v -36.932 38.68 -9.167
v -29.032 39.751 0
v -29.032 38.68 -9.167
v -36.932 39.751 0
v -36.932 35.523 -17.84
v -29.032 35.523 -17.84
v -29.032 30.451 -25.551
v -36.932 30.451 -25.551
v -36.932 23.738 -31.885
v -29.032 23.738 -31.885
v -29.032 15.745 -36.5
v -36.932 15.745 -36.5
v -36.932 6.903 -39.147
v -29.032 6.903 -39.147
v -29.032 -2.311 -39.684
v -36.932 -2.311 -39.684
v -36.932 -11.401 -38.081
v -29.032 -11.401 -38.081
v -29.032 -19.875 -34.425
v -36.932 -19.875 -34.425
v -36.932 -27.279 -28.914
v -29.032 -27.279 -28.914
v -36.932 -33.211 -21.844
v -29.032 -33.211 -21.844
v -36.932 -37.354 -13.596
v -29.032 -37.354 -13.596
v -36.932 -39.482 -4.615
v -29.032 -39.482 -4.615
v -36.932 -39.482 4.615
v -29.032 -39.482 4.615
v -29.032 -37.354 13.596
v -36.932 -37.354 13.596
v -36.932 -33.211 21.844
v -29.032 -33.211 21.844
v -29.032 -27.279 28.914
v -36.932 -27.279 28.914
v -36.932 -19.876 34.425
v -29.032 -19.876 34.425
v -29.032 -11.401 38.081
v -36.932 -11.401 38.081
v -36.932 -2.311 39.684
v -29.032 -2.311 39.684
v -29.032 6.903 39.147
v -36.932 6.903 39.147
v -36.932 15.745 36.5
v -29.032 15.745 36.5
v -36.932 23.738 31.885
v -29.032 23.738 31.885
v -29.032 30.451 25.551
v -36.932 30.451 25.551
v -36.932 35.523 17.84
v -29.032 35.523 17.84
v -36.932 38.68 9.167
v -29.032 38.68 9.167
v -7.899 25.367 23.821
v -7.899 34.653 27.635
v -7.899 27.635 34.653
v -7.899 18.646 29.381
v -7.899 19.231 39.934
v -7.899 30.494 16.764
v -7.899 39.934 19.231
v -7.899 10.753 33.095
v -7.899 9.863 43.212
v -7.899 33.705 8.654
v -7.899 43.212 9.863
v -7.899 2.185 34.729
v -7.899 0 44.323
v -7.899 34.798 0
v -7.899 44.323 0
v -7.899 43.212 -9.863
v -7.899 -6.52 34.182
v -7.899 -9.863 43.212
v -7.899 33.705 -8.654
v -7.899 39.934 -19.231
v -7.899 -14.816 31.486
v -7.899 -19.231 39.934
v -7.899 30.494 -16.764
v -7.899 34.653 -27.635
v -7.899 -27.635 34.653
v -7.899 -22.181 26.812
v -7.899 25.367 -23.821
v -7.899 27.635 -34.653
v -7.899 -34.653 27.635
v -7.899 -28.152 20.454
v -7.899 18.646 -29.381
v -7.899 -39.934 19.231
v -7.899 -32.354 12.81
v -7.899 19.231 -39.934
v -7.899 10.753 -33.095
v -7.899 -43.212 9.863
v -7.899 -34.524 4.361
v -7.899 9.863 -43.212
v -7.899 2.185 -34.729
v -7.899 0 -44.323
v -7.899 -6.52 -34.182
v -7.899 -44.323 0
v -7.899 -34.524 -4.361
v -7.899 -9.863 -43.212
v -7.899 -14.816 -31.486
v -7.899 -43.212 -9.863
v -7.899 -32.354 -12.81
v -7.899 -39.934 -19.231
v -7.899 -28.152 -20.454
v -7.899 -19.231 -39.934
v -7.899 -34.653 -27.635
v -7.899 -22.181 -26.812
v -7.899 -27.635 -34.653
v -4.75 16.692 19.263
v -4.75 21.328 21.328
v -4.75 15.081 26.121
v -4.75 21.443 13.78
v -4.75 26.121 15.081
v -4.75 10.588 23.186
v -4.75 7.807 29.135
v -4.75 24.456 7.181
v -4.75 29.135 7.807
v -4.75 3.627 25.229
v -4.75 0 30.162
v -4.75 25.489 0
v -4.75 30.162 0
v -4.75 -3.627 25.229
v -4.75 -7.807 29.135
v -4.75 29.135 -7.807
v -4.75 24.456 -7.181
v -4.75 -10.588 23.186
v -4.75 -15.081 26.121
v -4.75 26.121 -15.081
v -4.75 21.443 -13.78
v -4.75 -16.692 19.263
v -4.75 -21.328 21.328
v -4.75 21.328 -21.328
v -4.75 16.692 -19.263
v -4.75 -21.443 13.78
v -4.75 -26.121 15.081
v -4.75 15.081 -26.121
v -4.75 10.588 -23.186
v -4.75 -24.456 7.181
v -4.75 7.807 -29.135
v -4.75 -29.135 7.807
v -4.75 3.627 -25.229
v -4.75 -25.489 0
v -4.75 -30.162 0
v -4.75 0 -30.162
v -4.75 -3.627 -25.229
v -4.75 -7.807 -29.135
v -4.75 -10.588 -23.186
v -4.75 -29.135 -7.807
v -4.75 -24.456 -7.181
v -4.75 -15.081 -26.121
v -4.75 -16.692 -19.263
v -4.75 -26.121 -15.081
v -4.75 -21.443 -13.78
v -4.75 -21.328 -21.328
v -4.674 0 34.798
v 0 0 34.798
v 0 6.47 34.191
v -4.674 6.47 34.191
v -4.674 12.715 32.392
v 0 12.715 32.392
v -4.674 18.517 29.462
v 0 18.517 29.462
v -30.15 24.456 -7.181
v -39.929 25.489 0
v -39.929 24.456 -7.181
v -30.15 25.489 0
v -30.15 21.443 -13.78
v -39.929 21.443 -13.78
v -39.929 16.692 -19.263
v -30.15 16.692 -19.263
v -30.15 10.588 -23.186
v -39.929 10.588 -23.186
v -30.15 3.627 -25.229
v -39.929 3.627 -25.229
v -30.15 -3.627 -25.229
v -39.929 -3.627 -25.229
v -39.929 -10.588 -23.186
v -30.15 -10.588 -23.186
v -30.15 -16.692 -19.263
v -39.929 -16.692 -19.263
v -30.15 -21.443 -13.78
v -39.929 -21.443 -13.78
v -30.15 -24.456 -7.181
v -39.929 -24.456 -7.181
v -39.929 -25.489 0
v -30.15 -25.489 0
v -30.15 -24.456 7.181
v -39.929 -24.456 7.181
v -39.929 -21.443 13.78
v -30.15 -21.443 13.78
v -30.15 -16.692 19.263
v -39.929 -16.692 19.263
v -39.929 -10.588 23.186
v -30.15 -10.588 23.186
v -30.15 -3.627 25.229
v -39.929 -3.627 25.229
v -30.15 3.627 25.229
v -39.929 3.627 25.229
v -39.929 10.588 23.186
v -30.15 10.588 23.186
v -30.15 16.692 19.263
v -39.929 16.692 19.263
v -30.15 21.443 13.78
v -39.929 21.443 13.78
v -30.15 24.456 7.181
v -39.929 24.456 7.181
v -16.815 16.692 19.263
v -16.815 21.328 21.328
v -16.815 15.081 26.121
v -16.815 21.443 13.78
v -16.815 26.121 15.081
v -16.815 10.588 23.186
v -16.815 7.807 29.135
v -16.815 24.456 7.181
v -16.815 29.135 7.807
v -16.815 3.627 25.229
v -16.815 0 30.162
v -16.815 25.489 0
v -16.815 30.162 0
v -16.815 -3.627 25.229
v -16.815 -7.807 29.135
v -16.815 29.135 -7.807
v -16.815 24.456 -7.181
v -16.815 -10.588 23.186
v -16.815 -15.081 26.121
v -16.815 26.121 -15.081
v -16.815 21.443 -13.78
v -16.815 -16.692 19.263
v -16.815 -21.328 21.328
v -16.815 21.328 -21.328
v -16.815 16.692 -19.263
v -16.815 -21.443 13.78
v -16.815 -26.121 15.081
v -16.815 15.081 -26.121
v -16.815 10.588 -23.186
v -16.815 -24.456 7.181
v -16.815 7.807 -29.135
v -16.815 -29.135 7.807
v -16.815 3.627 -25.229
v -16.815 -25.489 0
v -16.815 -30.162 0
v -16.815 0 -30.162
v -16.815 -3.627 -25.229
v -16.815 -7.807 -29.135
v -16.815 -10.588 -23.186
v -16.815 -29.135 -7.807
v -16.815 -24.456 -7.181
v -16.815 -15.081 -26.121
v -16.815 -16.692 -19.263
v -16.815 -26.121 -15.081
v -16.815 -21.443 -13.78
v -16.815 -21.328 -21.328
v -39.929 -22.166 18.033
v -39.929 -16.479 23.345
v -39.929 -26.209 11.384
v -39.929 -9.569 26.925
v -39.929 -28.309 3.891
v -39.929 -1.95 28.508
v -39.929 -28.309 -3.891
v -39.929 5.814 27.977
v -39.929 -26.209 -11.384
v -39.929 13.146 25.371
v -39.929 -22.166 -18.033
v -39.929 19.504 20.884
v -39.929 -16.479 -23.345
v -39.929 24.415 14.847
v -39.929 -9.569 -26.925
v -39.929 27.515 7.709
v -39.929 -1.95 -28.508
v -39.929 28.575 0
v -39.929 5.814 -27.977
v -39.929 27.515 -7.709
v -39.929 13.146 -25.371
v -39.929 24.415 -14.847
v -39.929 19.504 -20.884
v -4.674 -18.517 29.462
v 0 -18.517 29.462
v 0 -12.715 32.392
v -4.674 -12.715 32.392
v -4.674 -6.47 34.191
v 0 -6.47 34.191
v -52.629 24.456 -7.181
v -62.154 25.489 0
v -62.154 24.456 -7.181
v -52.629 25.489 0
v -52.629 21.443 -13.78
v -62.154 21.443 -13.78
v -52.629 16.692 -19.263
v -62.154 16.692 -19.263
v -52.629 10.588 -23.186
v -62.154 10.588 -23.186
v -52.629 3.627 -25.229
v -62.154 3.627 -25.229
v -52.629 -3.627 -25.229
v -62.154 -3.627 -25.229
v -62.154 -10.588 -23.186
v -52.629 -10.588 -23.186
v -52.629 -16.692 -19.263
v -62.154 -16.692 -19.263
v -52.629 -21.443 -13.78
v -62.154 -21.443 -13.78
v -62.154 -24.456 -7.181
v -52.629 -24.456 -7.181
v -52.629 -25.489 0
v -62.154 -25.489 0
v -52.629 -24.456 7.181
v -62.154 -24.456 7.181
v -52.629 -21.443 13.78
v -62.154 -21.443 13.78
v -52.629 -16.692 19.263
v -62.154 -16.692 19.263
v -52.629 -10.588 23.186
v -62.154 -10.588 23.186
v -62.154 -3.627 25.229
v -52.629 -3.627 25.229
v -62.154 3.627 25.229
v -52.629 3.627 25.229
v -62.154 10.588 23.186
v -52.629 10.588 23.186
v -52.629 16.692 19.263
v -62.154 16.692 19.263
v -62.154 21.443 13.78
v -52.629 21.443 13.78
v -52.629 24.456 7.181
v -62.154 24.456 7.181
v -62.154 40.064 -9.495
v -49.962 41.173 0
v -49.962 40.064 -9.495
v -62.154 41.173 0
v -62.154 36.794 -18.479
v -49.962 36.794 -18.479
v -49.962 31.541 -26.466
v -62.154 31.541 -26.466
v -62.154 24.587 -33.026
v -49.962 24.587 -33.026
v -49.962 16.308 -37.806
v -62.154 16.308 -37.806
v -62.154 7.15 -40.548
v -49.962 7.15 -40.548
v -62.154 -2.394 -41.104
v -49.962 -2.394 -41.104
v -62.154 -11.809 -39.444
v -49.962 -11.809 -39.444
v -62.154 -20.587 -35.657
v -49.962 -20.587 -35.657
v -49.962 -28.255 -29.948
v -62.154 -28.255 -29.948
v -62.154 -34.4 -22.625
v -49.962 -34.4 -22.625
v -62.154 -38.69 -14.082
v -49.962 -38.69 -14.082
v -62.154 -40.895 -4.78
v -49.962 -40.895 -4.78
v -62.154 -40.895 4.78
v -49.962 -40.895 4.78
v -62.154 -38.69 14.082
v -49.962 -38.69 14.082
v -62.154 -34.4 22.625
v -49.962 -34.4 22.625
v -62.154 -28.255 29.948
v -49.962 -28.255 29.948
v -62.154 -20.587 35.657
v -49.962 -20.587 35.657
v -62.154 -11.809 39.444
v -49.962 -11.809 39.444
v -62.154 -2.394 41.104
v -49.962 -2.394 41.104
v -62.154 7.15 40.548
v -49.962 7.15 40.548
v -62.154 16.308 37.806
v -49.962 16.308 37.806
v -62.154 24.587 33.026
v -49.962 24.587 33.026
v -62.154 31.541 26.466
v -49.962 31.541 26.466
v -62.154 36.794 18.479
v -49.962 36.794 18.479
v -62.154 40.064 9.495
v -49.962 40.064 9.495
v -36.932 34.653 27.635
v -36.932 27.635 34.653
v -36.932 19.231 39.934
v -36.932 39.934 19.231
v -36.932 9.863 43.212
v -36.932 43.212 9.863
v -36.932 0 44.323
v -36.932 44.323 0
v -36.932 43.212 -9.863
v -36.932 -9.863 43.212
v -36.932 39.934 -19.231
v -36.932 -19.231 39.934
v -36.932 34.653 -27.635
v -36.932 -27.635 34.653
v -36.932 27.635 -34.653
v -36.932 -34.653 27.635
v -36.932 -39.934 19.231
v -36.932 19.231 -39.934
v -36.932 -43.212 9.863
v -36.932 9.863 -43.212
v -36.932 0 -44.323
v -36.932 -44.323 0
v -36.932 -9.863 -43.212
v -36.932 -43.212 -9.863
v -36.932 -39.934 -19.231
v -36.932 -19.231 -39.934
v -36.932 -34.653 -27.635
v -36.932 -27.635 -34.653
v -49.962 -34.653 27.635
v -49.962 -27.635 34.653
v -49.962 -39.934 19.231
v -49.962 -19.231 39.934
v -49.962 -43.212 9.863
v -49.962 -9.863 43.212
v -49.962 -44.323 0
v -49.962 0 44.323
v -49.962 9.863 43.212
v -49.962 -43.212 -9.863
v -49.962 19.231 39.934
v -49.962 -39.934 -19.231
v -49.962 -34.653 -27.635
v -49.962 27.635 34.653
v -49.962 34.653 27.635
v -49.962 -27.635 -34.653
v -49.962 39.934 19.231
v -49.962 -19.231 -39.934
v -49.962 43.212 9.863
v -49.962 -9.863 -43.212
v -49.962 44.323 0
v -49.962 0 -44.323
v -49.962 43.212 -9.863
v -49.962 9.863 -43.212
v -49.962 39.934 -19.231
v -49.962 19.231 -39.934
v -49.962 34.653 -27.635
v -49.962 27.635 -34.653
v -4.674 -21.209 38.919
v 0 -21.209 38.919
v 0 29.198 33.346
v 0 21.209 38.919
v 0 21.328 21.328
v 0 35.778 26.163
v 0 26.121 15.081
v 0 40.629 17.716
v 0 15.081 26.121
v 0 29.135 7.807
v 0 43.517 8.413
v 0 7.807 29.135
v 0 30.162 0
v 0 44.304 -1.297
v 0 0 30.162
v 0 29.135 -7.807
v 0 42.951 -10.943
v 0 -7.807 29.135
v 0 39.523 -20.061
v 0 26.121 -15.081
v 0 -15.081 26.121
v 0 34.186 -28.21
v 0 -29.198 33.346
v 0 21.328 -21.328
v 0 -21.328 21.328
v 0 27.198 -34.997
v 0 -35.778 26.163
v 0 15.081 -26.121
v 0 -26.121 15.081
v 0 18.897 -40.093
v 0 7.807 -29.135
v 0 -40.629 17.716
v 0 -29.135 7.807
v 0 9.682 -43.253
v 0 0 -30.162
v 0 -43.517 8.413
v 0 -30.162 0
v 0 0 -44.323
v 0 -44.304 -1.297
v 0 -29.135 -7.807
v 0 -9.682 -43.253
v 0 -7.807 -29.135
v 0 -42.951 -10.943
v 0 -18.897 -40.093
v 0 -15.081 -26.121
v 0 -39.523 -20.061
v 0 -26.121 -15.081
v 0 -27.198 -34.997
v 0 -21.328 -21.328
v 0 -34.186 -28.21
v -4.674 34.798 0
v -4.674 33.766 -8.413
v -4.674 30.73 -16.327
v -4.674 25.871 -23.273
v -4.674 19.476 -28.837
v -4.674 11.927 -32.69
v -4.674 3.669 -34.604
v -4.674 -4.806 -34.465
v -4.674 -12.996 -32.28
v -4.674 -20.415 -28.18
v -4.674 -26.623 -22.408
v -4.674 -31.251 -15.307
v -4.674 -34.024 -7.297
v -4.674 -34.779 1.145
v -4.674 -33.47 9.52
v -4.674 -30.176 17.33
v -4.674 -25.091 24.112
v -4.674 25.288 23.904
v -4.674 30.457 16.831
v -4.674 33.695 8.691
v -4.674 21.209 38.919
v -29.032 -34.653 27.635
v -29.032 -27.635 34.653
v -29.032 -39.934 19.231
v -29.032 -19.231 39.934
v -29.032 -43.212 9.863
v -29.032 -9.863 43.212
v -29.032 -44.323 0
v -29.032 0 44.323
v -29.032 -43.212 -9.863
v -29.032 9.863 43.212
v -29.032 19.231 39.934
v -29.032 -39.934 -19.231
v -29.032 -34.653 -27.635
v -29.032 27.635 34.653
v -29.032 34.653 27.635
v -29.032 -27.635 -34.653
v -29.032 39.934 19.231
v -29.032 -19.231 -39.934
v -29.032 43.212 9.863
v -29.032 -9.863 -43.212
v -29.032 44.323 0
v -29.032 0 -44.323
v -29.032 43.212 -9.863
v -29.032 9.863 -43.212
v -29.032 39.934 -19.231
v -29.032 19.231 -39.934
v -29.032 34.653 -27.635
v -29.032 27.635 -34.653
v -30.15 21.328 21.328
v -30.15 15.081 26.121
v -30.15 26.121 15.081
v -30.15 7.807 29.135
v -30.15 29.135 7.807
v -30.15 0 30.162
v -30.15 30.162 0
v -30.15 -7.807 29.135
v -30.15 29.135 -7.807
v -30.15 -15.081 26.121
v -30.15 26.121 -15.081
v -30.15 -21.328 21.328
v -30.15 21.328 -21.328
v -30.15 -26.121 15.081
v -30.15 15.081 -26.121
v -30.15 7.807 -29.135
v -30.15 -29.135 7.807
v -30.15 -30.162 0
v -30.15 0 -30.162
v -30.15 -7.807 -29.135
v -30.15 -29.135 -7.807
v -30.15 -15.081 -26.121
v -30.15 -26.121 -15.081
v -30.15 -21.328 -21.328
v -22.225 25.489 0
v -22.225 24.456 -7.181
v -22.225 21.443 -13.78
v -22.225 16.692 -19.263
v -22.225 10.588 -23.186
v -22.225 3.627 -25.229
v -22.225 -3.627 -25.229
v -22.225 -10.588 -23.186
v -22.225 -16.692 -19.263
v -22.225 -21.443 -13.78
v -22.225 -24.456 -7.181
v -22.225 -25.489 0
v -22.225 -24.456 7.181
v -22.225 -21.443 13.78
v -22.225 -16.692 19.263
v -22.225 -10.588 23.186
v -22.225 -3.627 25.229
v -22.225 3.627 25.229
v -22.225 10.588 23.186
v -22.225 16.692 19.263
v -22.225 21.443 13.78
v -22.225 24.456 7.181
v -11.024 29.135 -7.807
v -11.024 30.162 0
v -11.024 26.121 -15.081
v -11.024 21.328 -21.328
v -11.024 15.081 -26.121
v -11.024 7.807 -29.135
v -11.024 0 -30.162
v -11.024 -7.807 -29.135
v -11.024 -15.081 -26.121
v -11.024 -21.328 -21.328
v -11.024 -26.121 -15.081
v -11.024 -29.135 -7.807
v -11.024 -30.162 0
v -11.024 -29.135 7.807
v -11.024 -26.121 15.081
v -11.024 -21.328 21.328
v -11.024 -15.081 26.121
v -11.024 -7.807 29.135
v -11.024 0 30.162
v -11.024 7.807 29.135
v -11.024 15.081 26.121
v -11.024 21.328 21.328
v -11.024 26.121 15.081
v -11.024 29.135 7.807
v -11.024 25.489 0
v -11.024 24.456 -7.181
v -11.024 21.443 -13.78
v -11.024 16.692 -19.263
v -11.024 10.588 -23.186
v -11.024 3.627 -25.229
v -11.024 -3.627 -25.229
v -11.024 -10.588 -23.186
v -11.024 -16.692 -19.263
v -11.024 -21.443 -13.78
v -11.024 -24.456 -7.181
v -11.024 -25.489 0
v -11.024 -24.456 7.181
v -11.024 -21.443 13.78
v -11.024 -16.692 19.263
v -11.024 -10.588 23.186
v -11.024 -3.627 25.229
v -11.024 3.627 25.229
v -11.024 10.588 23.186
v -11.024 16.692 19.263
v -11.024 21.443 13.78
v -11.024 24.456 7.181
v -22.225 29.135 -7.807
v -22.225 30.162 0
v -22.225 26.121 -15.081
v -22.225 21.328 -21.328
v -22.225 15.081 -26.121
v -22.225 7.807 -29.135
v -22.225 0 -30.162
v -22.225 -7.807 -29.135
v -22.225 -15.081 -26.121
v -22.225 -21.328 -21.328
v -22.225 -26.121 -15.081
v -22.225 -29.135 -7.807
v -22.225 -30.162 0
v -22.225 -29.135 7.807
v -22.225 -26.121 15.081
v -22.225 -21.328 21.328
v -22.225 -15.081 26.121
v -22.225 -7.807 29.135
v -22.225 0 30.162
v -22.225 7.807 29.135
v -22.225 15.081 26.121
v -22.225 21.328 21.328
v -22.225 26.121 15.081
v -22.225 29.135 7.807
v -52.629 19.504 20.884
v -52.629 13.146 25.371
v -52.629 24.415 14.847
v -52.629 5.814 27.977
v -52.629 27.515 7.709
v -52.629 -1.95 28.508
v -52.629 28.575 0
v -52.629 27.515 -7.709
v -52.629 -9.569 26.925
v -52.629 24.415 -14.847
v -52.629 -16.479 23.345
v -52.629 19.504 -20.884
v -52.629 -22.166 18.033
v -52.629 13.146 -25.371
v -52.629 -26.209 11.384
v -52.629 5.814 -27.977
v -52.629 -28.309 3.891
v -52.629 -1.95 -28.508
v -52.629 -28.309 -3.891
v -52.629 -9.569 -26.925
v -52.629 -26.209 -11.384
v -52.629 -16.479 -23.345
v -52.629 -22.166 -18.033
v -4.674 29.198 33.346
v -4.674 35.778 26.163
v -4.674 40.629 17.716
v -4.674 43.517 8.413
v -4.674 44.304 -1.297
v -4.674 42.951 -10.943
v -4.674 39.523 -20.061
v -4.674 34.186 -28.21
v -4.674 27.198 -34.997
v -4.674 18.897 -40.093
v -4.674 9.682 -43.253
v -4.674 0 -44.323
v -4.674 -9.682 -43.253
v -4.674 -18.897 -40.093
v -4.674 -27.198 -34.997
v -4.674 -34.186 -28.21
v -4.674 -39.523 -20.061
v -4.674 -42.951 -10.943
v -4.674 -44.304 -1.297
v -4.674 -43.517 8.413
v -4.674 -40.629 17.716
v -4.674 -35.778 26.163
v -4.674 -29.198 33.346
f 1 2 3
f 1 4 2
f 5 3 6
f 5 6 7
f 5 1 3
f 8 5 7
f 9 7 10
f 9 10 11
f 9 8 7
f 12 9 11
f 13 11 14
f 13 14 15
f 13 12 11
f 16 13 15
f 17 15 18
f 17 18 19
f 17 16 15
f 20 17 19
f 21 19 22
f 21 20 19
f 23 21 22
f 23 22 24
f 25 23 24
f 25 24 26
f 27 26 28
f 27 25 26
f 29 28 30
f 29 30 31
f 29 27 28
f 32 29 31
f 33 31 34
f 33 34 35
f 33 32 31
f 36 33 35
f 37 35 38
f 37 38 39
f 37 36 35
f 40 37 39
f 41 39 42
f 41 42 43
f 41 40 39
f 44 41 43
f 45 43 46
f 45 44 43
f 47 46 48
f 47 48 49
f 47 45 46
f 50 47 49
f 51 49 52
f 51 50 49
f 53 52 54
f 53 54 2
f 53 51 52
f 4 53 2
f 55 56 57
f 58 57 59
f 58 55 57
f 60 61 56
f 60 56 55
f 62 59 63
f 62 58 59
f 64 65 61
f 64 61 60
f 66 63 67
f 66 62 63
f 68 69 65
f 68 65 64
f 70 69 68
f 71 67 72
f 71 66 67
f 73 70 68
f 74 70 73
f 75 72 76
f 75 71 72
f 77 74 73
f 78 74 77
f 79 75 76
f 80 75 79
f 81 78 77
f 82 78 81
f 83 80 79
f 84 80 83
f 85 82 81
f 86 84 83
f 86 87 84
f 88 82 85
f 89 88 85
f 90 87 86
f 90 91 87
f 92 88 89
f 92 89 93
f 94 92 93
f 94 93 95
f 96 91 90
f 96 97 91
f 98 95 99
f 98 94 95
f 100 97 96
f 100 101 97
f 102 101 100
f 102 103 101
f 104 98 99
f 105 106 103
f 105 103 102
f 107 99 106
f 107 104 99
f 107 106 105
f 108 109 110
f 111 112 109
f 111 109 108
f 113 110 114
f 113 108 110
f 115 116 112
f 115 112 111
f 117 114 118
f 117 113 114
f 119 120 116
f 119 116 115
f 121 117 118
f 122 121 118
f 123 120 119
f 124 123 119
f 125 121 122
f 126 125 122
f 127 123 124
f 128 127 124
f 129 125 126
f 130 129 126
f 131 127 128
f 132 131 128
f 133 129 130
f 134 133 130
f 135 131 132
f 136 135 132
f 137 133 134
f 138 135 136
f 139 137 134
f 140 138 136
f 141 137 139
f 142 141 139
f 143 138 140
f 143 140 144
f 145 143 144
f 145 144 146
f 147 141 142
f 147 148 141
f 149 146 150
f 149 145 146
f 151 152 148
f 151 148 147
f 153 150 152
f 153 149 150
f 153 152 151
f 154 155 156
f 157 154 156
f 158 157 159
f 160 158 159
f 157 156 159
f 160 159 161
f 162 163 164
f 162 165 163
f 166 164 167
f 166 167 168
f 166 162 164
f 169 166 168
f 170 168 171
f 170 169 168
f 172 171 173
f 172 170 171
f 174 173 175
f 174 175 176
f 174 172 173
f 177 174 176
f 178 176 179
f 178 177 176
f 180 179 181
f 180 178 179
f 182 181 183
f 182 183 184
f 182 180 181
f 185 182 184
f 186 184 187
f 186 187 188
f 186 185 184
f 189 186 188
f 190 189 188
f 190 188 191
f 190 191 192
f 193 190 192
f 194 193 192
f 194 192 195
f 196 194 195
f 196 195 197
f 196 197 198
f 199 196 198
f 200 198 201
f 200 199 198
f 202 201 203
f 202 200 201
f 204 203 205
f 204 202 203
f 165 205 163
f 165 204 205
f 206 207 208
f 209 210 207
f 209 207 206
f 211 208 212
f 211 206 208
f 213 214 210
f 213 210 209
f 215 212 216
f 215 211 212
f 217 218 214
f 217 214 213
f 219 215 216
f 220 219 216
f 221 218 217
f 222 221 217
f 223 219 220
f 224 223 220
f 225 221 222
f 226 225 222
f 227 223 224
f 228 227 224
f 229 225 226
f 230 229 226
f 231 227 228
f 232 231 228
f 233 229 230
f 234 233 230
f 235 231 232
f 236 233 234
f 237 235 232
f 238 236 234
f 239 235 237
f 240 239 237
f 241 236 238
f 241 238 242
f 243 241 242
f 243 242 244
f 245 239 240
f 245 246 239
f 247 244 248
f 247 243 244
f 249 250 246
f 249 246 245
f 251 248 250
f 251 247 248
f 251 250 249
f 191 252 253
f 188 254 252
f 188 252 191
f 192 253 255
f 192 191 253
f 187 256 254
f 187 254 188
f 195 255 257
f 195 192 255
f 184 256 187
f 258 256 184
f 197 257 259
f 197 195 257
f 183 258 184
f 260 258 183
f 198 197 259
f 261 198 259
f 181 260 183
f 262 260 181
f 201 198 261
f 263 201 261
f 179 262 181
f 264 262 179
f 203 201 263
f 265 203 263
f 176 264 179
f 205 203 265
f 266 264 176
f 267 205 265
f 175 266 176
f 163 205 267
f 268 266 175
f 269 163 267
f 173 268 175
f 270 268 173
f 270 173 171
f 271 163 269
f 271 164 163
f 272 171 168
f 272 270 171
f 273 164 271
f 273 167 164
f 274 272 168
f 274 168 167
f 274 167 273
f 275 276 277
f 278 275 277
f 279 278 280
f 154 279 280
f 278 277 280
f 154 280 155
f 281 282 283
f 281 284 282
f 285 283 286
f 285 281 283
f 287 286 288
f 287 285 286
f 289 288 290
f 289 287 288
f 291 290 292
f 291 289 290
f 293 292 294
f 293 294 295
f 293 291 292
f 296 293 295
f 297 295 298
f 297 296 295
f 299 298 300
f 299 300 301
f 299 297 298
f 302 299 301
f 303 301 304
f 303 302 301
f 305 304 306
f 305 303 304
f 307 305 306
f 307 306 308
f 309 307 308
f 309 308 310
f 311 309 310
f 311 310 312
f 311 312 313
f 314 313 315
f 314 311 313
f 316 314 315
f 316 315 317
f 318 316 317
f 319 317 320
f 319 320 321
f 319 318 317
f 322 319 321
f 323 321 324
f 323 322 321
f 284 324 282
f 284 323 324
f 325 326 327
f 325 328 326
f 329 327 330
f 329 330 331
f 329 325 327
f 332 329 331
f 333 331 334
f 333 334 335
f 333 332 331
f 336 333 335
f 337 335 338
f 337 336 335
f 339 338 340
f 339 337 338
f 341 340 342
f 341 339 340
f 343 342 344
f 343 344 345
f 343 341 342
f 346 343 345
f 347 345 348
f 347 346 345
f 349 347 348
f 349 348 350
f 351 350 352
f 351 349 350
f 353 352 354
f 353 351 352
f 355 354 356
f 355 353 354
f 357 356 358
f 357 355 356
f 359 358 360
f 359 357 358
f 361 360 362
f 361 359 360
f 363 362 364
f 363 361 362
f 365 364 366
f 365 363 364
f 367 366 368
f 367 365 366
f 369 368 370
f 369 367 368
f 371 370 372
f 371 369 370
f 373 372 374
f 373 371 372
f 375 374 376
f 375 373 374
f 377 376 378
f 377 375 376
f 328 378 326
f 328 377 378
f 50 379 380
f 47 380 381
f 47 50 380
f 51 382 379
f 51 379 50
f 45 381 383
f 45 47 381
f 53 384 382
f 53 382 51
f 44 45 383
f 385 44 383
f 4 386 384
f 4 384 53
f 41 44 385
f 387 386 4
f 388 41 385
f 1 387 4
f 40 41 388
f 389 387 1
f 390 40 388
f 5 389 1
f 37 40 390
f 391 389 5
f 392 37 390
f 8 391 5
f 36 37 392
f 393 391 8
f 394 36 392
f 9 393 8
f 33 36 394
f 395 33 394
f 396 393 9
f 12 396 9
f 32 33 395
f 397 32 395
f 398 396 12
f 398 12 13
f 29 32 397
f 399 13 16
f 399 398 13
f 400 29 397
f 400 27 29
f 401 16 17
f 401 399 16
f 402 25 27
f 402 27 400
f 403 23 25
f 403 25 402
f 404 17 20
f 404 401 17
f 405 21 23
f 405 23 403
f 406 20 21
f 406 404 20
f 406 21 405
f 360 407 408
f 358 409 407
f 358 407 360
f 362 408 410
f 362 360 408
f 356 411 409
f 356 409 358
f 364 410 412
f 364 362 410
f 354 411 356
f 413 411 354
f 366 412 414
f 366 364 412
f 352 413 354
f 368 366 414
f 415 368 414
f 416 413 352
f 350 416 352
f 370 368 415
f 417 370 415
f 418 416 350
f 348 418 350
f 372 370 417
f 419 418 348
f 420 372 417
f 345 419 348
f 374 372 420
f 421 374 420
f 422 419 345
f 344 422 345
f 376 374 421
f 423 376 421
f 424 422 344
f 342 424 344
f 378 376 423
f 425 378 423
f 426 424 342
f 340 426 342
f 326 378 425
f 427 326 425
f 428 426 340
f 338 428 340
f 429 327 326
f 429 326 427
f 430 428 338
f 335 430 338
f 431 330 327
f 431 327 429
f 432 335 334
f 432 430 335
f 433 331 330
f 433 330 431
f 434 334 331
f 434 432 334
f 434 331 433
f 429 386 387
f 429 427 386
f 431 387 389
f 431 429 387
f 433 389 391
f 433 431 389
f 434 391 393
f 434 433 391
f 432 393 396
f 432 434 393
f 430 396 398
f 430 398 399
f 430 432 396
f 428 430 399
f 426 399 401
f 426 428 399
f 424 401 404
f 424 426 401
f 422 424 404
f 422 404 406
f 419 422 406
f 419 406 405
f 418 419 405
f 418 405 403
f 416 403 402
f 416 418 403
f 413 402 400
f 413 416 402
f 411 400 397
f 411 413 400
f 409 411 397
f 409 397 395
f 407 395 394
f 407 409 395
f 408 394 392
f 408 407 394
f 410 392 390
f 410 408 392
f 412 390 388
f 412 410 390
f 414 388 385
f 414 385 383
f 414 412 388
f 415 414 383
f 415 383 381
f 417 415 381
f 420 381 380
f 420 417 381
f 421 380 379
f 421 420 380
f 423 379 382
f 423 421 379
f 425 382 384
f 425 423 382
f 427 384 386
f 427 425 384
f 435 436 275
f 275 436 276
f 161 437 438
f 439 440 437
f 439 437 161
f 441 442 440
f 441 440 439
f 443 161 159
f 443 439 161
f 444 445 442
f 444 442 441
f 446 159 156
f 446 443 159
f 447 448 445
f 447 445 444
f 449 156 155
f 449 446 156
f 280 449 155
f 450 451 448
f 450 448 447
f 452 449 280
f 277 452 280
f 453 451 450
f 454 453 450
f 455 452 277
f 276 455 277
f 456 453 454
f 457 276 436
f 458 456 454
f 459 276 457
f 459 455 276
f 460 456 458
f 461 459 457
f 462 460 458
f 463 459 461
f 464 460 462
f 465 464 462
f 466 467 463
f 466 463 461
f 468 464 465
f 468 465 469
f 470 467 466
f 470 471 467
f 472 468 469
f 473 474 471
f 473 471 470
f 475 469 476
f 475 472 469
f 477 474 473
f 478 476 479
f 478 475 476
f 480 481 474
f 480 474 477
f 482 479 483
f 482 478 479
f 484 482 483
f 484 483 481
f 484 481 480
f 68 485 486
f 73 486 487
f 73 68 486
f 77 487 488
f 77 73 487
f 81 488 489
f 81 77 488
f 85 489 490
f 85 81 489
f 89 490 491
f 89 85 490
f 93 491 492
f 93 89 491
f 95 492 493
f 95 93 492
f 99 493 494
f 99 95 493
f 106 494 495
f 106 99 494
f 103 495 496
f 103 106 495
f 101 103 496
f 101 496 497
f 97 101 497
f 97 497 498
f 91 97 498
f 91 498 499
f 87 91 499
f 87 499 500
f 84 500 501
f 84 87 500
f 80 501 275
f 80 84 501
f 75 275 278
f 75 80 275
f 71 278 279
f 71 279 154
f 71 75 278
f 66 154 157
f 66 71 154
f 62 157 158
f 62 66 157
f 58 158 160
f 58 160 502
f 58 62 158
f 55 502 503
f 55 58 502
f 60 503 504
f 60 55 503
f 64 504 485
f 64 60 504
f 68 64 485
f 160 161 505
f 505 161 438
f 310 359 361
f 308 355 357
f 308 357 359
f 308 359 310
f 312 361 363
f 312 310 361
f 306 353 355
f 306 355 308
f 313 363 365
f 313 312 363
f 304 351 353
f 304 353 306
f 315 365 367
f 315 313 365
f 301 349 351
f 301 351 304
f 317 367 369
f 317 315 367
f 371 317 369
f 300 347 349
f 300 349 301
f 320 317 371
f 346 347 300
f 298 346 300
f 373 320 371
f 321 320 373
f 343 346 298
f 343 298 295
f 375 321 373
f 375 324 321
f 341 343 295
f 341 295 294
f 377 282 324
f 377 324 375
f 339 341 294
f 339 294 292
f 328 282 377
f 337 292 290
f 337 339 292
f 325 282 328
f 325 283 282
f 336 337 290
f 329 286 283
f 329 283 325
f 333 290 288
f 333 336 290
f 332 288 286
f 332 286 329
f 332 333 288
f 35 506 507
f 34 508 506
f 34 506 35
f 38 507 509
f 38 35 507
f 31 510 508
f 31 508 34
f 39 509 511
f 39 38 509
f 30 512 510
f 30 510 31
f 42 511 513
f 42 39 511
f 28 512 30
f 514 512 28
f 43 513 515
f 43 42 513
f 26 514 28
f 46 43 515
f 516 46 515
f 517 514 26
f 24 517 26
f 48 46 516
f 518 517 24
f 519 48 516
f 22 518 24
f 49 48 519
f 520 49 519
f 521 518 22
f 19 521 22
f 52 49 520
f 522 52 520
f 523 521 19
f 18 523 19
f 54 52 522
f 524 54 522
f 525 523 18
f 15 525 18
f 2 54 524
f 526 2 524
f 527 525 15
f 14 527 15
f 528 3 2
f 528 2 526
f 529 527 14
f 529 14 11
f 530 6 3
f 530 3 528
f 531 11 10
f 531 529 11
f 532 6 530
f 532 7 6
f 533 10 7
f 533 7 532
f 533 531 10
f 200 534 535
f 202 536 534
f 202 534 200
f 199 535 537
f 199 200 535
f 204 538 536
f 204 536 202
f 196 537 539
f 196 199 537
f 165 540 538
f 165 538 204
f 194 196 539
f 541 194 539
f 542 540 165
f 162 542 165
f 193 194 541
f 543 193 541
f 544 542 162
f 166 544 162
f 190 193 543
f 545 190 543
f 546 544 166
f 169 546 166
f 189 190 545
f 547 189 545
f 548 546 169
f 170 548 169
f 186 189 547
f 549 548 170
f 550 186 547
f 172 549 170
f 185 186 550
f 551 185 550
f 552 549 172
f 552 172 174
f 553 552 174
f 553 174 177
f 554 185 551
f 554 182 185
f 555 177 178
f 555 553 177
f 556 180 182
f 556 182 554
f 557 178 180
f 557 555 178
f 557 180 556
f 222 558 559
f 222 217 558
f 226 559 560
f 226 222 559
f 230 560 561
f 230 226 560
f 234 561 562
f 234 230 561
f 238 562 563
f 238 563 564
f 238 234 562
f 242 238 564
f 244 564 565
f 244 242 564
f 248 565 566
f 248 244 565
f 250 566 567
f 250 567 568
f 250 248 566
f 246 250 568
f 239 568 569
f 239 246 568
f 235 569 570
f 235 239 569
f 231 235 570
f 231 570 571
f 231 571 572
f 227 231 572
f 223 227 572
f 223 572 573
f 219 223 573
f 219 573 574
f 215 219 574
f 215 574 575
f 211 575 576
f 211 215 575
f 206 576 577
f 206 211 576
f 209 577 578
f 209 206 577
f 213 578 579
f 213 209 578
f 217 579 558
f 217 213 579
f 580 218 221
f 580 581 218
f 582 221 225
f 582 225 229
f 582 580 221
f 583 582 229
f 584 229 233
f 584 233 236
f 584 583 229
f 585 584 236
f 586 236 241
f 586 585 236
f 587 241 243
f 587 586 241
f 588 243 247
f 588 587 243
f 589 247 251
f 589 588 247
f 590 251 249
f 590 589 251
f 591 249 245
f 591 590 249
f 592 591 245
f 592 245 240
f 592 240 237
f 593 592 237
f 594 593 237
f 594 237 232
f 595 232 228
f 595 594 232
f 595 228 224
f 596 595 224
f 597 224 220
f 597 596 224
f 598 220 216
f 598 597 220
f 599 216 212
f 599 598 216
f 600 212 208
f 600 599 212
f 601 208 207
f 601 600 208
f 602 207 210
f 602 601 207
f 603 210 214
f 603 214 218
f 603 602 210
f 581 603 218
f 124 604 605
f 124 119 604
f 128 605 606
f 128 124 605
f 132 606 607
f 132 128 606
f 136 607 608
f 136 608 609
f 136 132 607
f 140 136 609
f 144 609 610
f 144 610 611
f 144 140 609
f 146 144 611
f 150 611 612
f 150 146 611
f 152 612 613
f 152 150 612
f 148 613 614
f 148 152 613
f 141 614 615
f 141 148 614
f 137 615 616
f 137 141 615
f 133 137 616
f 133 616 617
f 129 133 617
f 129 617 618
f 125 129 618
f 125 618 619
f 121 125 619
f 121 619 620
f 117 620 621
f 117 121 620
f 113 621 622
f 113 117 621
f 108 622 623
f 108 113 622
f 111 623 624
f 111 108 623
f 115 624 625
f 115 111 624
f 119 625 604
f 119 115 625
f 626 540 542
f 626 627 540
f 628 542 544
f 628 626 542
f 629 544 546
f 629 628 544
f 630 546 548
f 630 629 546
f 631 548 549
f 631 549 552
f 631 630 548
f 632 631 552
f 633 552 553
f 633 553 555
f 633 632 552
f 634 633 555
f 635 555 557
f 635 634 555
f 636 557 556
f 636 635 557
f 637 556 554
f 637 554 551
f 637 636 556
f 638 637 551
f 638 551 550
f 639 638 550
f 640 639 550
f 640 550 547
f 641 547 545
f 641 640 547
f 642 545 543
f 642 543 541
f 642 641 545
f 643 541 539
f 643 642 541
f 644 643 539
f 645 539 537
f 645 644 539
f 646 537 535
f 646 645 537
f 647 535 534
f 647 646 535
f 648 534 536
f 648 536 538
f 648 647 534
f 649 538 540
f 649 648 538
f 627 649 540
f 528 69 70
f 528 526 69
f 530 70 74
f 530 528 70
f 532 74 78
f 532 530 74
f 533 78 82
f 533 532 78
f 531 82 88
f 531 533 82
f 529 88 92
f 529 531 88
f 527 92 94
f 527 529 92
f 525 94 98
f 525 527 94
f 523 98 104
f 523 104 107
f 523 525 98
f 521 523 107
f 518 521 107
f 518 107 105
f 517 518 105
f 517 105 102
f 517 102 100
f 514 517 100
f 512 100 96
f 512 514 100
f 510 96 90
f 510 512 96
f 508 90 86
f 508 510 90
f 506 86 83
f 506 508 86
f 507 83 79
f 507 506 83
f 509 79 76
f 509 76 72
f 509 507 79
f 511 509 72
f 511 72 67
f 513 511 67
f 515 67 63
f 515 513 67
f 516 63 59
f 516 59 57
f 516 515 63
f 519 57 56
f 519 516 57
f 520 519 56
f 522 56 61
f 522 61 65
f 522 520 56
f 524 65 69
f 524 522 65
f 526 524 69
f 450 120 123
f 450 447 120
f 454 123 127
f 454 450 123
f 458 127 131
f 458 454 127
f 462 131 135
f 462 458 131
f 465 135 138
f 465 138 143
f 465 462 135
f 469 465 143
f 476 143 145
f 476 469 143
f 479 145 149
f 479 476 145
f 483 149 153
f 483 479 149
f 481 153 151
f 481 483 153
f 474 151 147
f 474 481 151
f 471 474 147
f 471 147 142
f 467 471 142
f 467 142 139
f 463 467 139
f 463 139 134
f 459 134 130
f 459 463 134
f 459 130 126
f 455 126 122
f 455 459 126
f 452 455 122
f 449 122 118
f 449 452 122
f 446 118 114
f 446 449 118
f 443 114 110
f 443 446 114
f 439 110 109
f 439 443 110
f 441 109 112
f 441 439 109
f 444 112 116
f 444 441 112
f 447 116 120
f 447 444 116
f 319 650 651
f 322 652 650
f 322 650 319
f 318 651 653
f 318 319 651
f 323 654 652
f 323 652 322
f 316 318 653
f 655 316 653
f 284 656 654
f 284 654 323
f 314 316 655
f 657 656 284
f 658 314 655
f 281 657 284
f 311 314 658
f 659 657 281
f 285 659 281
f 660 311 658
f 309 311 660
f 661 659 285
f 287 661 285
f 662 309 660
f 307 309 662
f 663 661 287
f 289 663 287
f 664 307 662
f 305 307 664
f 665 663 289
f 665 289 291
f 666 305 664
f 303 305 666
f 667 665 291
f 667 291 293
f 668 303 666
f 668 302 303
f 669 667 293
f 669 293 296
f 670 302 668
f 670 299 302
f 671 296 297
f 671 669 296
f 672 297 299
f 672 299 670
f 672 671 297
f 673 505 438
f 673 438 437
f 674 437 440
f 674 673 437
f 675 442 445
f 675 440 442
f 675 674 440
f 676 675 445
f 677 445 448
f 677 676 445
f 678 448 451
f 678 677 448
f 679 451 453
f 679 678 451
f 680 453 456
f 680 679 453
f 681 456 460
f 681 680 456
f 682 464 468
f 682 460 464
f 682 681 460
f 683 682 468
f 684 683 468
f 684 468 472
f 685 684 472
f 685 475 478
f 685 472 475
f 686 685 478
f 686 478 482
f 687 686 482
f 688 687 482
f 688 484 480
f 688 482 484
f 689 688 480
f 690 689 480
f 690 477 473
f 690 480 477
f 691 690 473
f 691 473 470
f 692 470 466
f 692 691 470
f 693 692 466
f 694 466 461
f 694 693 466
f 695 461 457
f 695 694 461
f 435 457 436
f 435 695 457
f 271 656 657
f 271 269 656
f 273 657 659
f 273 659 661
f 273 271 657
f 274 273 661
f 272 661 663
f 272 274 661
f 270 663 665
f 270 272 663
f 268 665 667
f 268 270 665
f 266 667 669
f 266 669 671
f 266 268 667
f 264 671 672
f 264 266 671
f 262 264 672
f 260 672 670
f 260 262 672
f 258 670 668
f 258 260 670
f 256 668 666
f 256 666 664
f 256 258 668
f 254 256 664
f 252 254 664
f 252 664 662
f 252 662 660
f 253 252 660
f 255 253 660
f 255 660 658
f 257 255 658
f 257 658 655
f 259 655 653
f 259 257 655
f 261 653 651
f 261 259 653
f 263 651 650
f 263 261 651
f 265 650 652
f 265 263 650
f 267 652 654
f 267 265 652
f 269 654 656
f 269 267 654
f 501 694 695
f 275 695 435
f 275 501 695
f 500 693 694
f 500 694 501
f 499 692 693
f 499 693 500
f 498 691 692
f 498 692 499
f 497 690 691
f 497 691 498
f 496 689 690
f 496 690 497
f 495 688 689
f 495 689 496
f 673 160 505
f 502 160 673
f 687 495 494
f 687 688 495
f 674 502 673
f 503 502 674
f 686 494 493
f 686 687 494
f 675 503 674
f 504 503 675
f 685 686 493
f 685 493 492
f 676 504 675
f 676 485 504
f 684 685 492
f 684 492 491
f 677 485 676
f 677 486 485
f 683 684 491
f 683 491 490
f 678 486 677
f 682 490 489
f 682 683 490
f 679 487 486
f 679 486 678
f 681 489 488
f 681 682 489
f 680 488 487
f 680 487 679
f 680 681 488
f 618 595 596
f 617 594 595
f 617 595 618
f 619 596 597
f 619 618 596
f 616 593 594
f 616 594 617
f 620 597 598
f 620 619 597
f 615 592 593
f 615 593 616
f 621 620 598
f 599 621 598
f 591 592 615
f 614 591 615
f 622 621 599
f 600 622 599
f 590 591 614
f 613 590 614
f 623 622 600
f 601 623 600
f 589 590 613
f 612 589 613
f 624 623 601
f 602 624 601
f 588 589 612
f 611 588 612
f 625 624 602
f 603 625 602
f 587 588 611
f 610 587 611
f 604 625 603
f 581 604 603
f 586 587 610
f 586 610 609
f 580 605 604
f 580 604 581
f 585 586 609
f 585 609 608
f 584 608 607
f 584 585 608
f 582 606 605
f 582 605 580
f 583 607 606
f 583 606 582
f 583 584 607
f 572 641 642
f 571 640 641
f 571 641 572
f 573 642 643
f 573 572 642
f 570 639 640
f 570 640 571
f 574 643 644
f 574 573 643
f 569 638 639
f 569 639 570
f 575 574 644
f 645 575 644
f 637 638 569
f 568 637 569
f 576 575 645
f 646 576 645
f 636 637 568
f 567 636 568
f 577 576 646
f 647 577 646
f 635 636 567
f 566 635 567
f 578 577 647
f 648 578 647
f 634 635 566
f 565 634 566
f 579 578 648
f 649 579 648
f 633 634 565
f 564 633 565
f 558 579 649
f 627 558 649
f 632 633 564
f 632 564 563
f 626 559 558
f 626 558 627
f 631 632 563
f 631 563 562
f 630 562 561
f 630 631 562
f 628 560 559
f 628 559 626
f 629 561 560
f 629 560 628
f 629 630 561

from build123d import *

# Parameters (mm, degrees)
F3_DEPTH = 4.6736


# Not quite as in the source:
# - after a boolean that leaves OpenCascade's solid faulty, fix() repairs it


with BuildPart() as f1:
    # F0 (on Top) → F1 (revolve)
    with BuildSketch(Plane.XY):
        Polygon((-4.7498, 30.1625), (0, 30.1625), (0, 44.323), (-4.6736, 44.323), (-4.6736, 34.798), (-7.8994, 34.798), (-7.8994, 44.323), (-29.0322, 44.323), (-29.0322, 39.751), (-36.9316, 39.751), (-36.9316, 44.323), (-49.9618, 44.323), (-49.9618, 41.1734), (-62.1538, 41.1734), (-62.1538, 25.4889), (-52.6288, 25.4889), (-52.6288, 28.575), (-39.9288, 28.575), (-39.9288, 25.4889), (-30.1498, 25.4889), (-30.1498, 30.1625), (-22.225, 30.1625), (-22.225, 25.4889), (-16.8148, 25.4889), (-16.8148, 30.1625), (-11.0236, 30.1625), (-11.0236, 25.4889), (-4.7498, 25.4889), align=None)
    revolve(axis=Axis((-31.0769, 0, 0), (-1, 0, 0)))

    # F2 (on face) → F3 (cut)
    with BuildSketch(Plane.YZ):
        with BuildLine():
            ThreePointArc((-18.5166, 29.4624562527), (-9.6349948448, 33.4375190219), (0, 34.798))
            Line((0, 34.798), (0, 44.323))
            ThreePointArc((0, 44.323), (-10.9432900176, 42.950817601), (-21.209, 38.9192323665))
            Line((-21.209, 38.9192323665), (-18.5166, 29.4624562527))
        make_face()
        with BuildLine():
            Line((0, 44.323), (0, 34.798))
            ThreePointArc((0, 34.798), (9.6349948448, 33.4375190219), (18.5166, 29.4624562527))
            Line((18.5166, 29.4624562527), (21.209, 38.9192323665))
            ThreePointArc((21.209, 38.9192323665), (10.9432900176, 42.950817601), (0, 44.323))
        make_face()
    extrude(amount=-F3_DEPTH, mode=Mode.SUBTRACT)

    add(f1.part.fix(), mode=Mode.REPLACE)


solid = f1.part
